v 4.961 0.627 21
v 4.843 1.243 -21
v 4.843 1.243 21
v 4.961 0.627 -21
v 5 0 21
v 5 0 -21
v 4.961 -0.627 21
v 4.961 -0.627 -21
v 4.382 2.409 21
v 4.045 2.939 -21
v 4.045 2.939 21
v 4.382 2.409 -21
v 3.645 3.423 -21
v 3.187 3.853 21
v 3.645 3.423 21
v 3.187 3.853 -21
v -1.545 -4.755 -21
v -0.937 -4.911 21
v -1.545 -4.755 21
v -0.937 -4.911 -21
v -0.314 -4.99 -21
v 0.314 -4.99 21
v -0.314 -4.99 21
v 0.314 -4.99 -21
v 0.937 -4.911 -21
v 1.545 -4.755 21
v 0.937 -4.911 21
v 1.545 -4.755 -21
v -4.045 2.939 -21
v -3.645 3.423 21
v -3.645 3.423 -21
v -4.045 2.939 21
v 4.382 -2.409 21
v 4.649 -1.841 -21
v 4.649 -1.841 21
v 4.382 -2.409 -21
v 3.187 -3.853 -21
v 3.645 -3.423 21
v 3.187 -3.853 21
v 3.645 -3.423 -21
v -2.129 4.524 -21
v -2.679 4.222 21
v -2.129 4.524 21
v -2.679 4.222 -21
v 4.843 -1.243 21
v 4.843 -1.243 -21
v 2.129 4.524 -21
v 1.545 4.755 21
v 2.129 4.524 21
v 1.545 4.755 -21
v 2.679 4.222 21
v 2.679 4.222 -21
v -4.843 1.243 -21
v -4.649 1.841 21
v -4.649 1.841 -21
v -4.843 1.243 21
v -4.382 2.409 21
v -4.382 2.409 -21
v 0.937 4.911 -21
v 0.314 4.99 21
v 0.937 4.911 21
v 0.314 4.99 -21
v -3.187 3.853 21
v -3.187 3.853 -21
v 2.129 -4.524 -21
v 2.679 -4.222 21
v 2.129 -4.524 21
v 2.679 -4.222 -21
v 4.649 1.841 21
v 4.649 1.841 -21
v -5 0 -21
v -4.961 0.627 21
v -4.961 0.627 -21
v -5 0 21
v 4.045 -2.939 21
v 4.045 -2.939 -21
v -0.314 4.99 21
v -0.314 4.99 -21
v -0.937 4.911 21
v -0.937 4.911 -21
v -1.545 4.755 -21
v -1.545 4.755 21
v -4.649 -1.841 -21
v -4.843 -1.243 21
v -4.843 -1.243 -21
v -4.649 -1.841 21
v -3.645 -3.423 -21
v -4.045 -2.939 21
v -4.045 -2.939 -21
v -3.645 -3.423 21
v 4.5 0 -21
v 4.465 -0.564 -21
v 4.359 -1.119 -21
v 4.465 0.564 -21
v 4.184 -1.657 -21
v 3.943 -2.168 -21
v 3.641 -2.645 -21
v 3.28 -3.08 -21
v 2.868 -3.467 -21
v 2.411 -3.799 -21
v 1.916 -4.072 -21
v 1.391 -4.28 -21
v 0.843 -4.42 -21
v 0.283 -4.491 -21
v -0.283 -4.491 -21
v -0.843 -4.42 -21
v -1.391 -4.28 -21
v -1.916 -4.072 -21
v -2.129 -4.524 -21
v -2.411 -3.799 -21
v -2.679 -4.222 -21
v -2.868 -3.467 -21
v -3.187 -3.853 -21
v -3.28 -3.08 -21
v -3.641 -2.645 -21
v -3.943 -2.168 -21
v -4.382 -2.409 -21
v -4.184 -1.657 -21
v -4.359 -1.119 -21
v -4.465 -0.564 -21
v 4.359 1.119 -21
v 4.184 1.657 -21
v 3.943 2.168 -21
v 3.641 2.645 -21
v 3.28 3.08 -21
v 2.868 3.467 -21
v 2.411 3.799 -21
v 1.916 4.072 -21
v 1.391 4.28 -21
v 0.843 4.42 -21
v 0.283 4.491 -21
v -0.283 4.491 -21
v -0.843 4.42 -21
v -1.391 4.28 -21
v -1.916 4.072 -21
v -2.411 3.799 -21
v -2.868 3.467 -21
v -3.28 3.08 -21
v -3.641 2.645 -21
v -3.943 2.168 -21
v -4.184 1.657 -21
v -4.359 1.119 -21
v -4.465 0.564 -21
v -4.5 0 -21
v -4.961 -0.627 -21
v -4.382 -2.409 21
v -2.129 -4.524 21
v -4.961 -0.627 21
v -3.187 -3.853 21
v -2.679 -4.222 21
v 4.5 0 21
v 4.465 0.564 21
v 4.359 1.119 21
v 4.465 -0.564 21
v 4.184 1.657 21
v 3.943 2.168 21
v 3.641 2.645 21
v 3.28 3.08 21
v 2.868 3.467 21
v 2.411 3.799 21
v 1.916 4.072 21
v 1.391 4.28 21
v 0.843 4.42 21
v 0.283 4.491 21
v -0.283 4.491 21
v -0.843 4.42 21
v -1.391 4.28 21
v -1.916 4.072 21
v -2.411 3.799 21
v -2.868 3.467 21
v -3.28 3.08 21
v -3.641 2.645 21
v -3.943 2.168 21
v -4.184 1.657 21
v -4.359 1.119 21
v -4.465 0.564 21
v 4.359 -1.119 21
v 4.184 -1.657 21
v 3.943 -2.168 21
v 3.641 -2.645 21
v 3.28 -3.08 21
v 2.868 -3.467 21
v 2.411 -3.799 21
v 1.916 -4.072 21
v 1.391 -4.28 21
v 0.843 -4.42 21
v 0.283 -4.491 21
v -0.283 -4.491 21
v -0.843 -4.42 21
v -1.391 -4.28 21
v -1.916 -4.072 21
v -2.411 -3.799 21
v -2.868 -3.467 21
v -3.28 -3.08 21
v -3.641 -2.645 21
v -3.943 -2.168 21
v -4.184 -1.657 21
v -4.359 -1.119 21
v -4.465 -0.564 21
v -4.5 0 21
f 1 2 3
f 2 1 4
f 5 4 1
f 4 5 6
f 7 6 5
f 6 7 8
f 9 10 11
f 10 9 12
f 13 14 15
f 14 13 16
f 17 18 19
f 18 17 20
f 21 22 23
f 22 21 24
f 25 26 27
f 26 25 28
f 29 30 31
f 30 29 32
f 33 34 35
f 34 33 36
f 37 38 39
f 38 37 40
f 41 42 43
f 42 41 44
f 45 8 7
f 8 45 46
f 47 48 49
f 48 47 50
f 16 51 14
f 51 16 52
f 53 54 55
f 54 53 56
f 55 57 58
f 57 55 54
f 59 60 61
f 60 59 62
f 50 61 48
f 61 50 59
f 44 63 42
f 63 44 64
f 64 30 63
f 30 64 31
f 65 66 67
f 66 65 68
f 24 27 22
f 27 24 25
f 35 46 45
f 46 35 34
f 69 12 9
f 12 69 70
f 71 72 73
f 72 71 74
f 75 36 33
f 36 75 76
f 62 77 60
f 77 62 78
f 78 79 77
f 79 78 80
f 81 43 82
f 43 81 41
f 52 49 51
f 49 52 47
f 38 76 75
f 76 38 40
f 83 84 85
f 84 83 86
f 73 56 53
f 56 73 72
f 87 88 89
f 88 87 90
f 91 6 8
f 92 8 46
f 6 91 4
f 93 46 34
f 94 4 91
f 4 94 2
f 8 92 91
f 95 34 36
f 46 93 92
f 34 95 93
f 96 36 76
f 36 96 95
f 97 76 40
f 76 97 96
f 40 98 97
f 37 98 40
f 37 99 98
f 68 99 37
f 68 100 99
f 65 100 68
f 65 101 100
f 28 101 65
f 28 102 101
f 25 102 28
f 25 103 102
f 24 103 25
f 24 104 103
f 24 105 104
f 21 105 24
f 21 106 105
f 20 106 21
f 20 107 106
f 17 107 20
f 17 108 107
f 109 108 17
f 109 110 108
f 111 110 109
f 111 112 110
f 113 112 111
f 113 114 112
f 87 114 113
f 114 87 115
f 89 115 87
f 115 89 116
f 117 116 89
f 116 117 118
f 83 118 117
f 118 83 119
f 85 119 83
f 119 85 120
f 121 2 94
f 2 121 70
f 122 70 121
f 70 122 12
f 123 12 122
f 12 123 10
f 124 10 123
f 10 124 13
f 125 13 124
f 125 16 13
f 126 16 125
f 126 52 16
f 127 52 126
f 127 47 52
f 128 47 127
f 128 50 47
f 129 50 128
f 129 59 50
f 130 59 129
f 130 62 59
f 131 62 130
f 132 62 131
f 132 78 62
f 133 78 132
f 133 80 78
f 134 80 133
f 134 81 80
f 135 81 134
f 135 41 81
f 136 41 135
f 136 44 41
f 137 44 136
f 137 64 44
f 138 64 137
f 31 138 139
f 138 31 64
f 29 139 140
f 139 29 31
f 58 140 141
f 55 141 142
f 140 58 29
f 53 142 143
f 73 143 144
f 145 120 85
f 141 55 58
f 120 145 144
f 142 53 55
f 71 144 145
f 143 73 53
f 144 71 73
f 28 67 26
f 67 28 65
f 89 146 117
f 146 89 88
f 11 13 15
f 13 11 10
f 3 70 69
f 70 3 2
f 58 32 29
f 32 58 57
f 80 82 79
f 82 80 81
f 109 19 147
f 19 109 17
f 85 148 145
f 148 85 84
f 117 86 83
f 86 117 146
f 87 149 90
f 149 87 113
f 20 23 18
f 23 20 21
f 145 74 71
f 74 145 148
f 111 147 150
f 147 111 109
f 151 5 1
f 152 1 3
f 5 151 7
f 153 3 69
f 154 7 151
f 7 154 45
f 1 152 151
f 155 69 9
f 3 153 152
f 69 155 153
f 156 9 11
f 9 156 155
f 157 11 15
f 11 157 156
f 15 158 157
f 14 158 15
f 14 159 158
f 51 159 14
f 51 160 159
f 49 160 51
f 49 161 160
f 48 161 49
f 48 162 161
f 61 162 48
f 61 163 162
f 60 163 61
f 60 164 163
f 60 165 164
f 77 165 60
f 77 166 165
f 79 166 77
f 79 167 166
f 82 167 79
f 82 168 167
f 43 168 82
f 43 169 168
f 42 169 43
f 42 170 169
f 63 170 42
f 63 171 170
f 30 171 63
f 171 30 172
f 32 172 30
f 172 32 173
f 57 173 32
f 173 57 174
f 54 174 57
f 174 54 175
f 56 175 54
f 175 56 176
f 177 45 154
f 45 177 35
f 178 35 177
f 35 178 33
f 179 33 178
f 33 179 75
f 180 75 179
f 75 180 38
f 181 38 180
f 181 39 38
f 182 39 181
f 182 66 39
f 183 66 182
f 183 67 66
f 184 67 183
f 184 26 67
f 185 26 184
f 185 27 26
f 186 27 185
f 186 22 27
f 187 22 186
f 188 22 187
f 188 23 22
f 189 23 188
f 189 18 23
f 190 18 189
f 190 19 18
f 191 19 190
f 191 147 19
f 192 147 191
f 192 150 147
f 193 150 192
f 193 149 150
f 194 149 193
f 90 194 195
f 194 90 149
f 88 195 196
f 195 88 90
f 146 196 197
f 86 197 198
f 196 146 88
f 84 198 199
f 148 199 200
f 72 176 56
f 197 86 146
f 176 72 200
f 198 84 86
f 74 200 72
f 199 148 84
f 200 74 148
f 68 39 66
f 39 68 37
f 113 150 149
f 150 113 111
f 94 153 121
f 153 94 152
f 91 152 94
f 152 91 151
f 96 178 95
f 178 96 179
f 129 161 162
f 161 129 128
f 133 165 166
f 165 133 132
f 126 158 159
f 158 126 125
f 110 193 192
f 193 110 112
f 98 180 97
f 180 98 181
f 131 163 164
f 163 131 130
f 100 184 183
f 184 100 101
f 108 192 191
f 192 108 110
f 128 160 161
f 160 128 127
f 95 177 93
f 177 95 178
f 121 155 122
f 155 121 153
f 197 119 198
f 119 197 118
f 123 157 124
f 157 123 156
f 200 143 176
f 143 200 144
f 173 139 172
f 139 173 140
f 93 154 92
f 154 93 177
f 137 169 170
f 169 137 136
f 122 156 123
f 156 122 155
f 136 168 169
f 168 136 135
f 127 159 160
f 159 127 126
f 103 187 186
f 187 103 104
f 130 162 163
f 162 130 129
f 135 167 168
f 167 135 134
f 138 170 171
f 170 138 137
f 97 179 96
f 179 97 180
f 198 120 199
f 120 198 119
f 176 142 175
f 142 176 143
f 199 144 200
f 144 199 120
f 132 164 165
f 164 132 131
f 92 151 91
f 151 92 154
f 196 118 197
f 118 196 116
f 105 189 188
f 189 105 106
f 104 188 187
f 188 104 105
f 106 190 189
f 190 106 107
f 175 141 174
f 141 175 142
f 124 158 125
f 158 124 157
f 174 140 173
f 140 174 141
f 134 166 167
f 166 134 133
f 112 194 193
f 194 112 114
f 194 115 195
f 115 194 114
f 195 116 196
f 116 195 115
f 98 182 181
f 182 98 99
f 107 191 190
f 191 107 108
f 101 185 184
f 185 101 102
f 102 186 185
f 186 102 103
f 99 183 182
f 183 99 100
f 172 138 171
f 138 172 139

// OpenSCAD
$fn = 50;


difference() {
	union() {
		translate(v = [0, 0, -21.0000000000]) {
			cylinder(h = 42, r = 5.0000000000);
		}
	}
	union() {
		translate(v = [0, 0, -100.0000000000]) {
			cylinder(h = 200, r = 4.5000000000);
		}
	}
}
